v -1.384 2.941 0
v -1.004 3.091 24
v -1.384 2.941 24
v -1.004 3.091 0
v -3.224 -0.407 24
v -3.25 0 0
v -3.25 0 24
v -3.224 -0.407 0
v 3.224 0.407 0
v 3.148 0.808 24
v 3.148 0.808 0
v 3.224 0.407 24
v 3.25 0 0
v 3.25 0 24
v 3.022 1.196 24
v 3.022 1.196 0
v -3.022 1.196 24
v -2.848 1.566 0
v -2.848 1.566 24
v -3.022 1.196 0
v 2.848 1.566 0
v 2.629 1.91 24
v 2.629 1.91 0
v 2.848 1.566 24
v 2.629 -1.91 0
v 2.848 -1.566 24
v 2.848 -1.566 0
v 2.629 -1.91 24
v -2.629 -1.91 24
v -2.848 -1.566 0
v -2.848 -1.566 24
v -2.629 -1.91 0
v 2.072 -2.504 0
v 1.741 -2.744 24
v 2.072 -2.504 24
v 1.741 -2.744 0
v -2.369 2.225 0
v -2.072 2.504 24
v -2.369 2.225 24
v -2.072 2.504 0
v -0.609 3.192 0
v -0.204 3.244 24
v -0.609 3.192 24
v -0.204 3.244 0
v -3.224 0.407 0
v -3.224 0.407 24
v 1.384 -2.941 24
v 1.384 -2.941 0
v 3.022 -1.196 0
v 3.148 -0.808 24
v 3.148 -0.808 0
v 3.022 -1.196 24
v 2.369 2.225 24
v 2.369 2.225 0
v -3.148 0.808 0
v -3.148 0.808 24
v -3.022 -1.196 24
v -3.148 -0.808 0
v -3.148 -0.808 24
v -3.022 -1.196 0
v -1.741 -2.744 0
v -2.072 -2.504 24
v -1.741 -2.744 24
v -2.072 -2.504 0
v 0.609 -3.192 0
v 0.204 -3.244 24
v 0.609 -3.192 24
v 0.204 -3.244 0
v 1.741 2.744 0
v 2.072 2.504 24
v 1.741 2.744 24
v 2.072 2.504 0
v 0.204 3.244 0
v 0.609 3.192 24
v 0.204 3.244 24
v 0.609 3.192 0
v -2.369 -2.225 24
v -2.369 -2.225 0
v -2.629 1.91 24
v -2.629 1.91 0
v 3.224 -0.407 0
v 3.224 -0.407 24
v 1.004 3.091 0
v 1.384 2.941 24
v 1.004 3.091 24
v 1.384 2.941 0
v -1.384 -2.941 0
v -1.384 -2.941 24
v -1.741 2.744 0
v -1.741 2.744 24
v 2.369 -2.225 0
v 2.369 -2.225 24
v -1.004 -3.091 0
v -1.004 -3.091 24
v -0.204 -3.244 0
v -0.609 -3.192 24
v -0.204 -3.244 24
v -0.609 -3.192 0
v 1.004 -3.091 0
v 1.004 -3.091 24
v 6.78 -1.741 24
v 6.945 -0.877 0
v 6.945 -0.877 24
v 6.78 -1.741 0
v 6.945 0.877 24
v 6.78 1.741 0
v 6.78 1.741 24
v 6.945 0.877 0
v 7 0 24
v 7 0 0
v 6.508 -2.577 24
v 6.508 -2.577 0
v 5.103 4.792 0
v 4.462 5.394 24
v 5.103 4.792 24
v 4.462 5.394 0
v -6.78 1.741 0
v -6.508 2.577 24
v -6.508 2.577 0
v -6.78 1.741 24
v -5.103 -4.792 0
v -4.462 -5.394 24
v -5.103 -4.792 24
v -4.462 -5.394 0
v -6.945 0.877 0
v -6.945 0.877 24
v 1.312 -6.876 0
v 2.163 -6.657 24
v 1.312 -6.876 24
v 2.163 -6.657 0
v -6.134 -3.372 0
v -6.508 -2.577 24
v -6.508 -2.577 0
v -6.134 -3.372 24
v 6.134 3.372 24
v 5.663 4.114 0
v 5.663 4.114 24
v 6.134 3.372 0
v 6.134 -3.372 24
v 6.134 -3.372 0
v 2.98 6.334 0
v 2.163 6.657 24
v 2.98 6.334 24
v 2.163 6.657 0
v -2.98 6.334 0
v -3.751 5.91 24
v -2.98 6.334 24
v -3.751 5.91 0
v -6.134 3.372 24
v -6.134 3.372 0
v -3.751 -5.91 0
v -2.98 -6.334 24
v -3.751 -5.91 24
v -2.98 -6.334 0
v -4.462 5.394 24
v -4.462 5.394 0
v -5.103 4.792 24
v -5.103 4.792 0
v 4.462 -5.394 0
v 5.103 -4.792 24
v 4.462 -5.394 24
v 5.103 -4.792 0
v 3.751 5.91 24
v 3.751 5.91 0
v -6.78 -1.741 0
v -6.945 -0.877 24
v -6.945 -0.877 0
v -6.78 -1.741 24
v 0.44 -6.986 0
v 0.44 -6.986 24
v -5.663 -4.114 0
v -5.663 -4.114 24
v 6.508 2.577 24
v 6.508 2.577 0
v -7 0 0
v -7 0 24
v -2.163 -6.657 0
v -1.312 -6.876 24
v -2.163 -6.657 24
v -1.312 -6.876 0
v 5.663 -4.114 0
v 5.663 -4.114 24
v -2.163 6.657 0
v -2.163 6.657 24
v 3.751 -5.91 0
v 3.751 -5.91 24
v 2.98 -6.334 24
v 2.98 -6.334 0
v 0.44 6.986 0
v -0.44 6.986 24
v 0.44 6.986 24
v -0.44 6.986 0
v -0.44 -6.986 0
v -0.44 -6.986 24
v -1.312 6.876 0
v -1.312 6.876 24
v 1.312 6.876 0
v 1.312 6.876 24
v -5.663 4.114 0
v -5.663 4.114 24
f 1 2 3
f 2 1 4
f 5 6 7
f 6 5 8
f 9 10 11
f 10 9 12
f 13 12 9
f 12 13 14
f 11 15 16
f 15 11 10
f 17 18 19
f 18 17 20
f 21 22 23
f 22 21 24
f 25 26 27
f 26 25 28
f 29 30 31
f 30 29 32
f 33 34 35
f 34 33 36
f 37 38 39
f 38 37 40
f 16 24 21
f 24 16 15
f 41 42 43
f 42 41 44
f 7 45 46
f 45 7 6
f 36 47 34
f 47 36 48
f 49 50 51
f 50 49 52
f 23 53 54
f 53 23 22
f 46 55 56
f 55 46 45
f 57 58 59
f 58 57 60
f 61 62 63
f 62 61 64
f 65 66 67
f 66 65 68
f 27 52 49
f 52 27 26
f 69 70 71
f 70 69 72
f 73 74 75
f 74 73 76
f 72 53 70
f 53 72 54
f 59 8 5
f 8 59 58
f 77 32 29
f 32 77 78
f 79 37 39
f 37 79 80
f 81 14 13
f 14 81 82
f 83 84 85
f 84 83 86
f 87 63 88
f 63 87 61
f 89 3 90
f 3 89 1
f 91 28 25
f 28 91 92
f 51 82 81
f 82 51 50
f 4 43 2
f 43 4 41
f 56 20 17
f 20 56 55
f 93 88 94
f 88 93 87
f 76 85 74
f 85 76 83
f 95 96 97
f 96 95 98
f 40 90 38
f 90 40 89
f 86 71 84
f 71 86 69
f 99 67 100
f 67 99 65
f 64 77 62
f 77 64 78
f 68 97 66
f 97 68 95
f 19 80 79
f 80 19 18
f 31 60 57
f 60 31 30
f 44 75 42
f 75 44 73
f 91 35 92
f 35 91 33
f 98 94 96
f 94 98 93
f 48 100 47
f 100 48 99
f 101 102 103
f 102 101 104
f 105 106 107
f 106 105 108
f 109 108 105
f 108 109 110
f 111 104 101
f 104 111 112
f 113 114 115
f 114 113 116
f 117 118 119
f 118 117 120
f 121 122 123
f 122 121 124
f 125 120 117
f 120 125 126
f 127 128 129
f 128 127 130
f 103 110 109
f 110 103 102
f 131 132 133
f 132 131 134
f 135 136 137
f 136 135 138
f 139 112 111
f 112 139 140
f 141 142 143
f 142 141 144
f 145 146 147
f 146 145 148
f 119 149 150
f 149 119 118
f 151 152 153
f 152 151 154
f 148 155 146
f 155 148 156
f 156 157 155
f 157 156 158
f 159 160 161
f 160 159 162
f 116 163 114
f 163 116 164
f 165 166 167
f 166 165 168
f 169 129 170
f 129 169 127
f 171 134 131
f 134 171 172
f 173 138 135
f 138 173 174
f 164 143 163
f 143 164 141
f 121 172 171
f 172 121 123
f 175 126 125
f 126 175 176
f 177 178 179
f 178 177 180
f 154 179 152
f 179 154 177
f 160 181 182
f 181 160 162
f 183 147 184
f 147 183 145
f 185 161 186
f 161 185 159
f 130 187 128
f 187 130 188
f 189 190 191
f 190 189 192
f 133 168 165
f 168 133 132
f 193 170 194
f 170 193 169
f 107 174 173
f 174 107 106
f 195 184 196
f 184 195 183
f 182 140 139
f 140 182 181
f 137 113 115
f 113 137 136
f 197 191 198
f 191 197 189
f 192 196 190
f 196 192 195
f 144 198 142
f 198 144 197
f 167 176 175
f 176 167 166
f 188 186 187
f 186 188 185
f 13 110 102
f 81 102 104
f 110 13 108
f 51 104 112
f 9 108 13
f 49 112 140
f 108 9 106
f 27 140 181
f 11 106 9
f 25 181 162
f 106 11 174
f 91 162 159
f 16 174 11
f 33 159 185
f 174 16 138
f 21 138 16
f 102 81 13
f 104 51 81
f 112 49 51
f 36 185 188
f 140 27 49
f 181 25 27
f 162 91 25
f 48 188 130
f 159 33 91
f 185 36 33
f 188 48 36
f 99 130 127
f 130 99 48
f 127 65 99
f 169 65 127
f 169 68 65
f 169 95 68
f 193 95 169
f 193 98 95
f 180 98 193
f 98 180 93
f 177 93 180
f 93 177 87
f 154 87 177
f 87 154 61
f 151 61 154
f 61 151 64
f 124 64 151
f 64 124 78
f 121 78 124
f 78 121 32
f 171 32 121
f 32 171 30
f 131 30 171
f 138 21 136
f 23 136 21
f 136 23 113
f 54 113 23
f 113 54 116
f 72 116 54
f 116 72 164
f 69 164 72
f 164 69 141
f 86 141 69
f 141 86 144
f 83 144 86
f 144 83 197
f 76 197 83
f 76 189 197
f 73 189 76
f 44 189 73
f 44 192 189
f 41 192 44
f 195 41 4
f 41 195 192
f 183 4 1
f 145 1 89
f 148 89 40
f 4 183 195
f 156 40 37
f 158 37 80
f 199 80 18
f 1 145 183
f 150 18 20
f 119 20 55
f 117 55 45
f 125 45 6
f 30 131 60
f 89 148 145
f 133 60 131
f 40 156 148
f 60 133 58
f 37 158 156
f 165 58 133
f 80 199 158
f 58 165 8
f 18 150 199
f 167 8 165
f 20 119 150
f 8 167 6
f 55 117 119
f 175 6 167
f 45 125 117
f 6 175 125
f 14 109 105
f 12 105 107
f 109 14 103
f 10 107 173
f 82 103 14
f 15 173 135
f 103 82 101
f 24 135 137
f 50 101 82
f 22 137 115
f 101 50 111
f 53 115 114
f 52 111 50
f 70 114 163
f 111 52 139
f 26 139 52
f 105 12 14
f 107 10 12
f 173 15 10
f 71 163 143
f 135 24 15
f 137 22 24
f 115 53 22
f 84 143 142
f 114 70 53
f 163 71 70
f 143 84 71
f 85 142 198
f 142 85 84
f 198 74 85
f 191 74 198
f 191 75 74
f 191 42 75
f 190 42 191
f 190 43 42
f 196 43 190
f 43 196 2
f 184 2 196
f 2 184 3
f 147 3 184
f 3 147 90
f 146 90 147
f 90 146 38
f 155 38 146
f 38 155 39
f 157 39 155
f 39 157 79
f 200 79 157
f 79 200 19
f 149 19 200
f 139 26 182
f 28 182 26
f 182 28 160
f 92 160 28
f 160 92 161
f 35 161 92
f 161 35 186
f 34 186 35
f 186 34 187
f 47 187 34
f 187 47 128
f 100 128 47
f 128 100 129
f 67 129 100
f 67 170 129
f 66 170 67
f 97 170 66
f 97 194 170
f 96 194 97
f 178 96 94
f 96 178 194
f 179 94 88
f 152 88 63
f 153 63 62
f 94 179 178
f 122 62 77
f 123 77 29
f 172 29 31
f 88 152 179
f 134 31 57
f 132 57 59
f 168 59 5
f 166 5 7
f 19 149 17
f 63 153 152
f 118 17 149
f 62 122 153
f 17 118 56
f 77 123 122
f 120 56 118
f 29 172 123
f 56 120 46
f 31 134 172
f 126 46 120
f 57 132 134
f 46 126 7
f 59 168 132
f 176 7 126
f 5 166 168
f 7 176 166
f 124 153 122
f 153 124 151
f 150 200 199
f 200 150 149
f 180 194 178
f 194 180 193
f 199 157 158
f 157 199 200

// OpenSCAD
$fn = 50;


difference() {
	union() {
		*color(alpha = 1.0000000000, c = "gray") {
			translate(v = [0, 7, 0]) {
				linear_extrude(height = 1) {
					text(font = "Arial:style=Bold", halign = "center", size = 4.5000000000, text = "COMMENT plate main", valign = "center");
				}
			}
		}
		*color(alpha = 1.0000000000, c = "gray") {
			translate(v = [0, 14, 0]) {
				linear_extrude(height = 1) {
					text(font = "Arial:style=Bold", halign = "center", size = 4.5000000000, text = "COMMENT description oobb_plate_shape_p_type_24_depth_1_width_1_height_24_thickness_true_both_holes", valign = "center");
				}
			}
		}
		cylinder(h = 24, r = 7.0000000000);
	}
	union() {
		*color(alpha = 1.0000000000, c = "gray") {
			translate(v = [0, 7, 0]) {
				linear_extrude(height = 1) {
					text(font = "Arial:style=Bold", halign = "center", size = 4.5000000000, text = "COMMENT holes main", valign = "center");
				}
			}
		}
		*color(alpha = 1.0000000000, c = "gray") {
			translate(v = [0, 14, 0]) {
				linear_extrude(height = 1) {
					text(font = "Arial:style=Bold", halign = "center", size = 4.5000000000, text = "COMMENT description oobb_holes_shape_n_type_1_width_1_height_24_thickness_true_both_holes", valign = "center");
				}
			}
		}
		translate(v = [0, 0, -50]) {
			cylinder(h = 100, r = 3.2500000000);
		}
		translate(v = [0, 0, -50]) {
			cylinder(h = 100, r = 1.8000000000);
		}
	}
}
